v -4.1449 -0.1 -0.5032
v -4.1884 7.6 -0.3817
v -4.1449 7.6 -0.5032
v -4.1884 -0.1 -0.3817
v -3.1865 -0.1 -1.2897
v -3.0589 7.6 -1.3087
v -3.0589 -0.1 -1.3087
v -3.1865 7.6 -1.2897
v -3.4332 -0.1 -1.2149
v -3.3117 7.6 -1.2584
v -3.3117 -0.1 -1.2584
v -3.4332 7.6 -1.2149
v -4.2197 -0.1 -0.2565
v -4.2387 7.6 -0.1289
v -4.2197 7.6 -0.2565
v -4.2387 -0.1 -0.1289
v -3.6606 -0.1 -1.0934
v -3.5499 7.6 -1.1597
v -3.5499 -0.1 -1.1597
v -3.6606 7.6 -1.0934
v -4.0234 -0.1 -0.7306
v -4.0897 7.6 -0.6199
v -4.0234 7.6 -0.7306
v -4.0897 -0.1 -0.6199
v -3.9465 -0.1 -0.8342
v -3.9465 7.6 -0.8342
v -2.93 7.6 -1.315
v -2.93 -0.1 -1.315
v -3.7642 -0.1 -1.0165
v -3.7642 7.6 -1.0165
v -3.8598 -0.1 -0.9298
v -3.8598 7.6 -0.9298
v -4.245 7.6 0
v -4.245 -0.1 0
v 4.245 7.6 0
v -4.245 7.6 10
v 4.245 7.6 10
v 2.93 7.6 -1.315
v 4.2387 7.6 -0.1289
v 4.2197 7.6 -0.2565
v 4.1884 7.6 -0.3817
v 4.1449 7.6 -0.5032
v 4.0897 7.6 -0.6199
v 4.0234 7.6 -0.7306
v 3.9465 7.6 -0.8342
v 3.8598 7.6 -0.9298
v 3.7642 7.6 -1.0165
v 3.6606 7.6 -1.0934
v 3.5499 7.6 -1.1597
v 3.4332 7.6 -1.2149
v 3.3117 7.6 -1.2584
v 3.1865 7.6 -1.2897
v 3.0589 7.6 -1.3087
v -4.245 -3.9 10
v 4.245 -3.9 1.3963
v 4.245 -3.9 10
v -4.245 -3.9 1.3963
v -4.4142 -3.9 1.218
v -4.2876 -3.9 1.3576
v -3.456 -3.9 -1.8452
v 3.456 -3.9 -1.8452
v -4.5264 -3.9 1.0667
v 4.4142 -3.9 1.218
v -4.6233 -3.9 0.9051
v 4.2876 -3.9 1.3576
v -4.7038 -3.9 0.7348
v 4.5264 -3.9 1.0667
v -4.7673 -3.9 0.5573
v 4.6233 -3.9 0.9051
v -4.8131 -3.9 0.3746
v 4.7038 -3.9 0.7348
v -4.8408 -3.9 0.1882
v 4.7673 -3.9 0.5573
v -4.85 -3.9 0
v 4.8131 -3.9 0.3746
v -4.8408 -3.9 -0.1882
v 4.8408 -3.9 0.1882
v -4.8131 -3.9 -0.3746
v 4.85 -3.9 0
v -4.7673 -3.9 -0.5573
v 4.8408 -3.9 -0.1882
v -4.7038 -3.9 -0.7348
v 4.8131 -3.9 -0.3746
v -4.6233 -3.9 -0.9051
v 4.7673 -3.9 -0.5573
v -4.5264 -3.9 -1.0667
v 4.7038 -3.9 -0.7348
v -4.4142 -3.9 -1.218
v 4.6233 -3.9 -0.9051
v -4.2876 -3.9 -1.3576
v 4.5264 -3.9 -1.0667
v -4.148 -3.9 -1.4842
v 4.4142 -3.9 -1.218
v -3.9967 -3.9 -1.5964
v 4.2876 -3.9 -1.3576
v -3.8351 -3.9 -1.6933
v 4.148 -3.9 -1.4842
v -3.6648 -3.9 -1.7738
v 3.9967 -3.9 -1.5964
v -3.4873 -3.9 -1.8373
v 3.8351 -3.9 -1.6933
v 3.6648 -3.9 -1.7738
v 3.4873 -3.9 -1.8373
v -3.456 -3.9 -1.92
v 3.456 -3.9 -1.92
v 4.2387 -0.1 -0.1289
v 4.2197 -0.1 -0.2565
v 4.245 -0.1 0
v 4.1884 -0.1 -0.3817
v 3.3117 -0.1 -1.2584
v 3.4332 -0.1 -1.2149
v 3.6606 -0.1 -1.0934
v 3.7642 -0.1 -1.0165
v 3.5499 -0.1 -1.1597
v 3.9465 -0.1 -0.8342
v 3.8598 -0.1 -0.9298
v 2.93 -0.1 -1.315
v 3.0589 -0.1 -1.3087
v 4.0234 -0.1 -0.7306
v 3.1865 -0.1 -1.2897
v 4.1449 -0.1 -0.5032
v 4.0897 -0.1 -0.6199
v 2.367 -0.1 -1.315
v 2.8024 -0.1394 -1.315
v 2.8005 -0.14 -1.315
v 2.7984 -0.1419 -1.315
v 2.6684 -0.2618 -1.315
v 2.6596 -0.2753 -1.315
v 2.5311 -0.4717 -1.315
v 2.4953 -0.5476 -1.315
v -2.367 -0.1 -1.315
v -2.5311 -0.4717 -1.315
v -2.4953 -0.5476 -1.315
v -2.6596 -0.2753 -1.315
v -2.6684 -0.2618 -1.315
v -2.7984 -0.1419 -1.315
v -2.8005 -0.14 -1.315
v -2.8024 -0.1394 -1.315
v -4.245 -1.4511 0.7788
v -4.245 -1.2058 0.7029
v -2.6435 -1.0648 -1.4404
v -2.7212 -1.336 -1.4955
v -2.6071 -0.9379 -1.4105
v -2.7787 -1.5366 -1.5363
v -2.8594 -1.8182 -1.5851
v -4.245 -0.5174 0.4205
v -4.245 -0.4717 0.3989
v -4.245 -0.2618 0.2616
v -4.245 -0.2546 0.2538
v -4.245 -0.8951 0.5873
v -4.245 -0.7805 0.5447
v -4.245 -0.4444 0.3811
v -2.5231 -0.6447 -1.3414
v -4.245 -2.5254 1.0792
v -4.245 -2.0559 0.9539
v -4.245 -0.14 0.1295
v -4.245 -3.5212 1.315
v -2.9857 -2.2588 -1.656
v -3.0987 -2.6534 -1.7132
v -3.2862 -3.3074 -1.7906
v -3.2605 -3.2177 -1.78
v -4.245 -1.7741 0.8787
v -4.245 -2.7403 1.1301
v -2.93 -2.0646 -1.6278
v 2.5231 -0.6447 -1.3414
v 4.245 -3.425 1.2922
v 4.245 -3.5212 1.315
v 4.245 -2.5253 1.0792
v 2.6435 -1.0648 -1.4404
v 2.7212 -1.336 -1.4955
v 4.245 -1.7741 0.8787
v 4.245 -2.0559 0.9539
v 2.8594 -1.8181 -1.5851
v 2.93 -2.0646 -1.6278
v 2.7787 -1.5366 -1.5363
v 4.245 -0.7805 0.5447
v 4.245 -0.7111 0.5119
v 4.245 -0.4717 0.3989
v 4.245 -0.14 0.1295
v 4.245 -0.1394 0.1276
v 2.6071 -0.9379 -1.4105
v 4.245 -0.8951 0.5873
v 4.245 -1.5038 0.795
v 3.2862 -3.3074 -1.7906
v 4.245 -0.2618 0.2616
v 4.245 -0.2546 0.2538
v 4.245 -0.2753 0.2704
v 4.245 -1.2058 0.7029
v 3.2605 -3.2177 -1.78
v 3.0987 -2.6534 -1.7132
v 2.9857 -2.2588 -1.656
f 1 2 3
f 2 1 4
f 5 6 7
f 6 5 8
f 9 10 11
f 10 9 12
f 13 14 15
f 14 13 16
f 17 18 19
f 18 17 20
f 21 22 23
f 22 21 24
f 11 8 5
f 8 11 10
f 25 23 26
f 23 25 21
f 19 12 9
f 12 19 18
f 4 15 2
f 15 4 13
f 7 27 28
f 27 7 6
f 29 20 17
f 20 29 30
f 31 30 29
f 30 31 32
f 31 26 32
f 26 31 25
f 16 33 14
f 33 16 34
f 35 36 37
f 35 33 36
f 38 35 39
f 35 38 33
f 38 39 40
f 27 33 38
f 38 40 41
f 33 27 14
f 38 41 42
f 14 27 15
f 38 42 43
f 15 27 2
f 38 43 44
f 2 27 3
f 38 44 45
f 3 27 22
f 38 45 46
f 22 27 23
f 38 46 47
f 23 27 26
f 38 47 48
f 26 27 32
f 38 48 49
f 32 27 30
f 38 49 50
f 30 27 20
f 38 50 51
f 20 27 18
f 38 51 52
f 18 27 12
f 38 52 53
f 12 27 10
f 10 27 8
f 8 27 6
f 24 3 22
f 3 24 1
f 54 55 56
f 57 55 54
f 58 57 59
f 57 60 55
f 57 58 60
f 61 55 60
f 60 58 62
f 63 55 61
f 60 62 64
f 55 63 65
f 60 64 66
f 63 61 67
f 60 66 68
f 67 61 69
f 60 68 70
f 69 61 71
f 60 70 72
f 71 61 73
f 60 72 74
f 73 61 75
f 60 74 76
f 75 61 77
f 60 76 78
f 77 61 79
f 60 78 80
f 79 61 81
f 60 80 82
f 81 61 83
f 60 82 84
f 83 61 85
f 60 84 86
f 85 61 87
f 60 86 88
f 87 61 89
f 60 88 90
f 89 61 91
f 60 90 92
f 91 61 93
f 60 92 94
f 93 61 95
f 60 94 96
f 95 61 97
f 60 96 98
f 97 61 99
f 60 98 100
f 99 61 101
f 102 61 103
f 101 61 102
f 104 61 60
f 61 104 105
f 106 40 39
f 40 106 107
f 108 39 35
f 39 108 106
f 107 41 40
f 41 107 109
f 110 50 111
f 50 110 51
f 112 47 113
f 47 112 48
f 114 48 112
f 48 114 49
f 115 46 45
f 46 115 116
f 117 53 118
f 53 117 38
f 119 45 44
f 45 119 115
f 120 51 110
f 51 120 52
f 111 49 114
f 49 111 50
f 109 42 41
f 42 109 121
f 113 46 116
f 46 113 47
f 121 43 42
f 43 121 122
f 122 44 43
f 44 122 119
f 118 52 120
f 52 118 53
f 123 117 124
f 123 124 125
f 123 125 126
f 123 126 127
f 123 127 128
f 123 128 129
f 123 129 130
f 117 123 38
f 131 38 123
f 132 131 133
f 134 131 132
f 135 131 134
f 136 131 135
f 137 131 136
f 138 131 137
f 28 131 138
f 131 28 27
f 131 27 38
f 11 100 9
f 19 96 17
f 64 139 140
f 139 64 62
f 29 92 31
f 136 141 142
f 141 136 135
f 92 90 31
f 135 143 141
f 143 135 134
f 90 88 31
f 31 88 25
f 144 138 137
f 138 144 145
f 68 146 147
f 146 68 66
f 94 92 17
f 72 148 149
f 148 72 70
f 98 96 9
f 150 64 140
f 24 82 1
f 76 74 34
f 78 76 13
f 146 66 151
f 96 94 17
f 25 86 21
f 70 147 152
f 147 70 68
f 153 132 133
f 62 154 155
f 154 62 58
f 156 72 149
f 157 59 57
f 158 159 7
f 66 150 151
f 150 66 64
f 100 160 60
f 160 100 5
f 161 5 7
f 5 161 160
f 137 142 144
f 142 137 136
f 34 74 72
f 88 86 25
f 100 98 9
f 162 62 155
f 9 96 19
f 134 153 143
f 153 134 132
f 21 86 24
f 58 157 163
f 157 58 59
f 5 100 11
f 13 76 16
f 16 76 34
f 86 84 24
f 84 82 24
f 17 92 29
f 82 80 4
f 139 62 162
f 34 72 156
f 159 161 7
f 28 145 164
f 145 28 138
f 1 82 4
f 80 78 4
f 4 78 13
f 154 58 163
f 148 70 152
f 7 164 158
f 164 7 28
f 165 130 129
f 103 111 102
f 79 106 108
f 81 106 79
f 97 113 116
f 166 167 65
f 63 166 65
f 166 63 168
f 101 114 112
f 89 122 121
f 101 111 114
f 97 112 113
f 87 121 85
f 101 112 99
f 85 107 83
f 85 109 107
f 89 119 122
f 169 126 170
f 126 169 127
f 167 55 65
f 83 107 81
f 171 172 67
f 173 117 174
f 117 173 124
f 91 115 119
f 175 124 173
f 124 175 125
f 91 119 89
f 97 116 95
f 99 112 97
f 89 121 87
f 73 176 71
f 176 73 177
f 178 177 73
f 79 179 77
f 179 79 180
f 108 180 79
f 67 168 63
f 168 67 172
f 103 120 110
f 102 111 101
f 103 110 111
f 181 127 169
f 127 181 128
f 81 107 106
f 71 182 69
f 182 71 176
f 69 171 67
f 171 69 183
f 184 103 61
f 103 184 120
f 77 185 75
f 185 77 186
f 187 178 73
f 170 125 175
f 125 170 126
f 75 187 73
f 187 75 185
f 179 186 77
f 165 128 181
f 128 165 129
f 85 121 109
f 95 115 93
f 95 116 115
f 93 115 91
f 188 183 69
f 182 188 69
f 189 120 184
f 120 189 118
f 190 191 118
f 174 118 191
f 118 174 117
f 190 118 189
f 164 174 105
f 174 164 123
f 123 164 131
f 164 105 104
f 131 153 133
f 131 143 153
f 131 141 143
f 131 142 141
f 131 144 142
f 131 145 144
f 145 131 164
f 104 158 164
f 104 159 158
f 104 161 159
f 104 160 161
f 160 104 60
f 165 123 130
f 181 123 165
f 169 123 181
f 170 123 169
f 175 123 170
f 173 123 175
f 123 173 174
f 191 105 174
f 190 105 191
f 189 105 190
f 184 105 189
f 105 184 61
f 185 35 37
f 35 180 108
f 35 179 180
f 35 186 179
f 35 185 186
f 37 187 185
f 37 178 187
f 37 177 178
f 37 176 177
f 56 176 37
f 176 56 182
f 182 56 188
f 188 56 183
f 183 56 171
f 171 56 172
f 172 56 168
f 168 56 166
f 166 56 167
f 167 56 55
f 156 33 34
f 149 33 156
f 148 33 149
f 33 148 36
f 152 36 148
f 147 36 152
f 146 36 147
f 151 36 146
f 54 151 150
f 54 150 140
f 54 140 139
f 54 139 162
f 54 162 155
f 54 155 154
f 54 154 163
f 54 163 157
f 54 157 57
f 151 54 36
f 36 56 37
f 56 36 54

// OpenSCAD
// file: ../usb_c_cutout.scad
// The cutout for the USB-C plug
module usb_c_cutout(usb_c_r, usb_c_w, usb_c_h, front_thickness, open_top) {
    length = 10 + front_thickness;

    // The plug is "pushed in" by an extra 0.6 to account for 3d printing tolerances
    translate([-usb_c_w / 2 + usb_c_r, 7 - length + 0.6, usb_c_r])
        rotate([-90, 0, 0])
            union() {
                translate([0, usb_c_r, 0])
                    cylinder(r=usb_c_r, h=length, $fn=64);

                translate([usb_c_w - usb_c_r * 2, usb_c_r, 0])
                    cylinder(r=usb_c_r, h=length, $fn=64);

                cube([usb_c_w - usb_c_r * 2, usb_c_r * 2, length]);

                // Cutout for the pin side of the shell that expands out
                lesser = 7.7;

                translate([0, usb_c_r, 0])
                    cylinder(r2=usb_c_r, r1=3.84 / 2, h=length - lesser, $fn=64);

                translate([usb_c_w - usb_c_r * 2, usb_c_r, 0])
                    cylinder(r2=usb_c_r, r1=3.84 / 2, h=length - lesser, $fn=64);

                translate([usb_c_w / 2 - usb_c_r, usb_c_r, 0])
                    scale([1.8, 1, 1])
                        rotate([0, 0, 45])
                            cylinder(r2=usb_c_r * sqrt(2), r1=3.84 / 2 * sqrt(2), h=length - lesser, $fn=4);

                // If the card drops in from the top rather than sliding in from the front,
                // cut out a slot for the USB-C plug to drop into.
                if (open_top) {
                    translate([-usb_c_r, -10 + usb_c_r, 0])
                        cube([usb_c_w, 10, length]);
                }
            }
}
// main file
use <../usb_c_cutout.scad>

// USB-C plug dimensions
usb_c_r = 1.315;
usb_c_w = 5.86 + usb_c_r * 2;
usb_c_h = 2.2;
front_thickness = 1.5;

usb_c_cutout(usb_c_r, usb_c_w, usb_c_h, front_thickness, true);
